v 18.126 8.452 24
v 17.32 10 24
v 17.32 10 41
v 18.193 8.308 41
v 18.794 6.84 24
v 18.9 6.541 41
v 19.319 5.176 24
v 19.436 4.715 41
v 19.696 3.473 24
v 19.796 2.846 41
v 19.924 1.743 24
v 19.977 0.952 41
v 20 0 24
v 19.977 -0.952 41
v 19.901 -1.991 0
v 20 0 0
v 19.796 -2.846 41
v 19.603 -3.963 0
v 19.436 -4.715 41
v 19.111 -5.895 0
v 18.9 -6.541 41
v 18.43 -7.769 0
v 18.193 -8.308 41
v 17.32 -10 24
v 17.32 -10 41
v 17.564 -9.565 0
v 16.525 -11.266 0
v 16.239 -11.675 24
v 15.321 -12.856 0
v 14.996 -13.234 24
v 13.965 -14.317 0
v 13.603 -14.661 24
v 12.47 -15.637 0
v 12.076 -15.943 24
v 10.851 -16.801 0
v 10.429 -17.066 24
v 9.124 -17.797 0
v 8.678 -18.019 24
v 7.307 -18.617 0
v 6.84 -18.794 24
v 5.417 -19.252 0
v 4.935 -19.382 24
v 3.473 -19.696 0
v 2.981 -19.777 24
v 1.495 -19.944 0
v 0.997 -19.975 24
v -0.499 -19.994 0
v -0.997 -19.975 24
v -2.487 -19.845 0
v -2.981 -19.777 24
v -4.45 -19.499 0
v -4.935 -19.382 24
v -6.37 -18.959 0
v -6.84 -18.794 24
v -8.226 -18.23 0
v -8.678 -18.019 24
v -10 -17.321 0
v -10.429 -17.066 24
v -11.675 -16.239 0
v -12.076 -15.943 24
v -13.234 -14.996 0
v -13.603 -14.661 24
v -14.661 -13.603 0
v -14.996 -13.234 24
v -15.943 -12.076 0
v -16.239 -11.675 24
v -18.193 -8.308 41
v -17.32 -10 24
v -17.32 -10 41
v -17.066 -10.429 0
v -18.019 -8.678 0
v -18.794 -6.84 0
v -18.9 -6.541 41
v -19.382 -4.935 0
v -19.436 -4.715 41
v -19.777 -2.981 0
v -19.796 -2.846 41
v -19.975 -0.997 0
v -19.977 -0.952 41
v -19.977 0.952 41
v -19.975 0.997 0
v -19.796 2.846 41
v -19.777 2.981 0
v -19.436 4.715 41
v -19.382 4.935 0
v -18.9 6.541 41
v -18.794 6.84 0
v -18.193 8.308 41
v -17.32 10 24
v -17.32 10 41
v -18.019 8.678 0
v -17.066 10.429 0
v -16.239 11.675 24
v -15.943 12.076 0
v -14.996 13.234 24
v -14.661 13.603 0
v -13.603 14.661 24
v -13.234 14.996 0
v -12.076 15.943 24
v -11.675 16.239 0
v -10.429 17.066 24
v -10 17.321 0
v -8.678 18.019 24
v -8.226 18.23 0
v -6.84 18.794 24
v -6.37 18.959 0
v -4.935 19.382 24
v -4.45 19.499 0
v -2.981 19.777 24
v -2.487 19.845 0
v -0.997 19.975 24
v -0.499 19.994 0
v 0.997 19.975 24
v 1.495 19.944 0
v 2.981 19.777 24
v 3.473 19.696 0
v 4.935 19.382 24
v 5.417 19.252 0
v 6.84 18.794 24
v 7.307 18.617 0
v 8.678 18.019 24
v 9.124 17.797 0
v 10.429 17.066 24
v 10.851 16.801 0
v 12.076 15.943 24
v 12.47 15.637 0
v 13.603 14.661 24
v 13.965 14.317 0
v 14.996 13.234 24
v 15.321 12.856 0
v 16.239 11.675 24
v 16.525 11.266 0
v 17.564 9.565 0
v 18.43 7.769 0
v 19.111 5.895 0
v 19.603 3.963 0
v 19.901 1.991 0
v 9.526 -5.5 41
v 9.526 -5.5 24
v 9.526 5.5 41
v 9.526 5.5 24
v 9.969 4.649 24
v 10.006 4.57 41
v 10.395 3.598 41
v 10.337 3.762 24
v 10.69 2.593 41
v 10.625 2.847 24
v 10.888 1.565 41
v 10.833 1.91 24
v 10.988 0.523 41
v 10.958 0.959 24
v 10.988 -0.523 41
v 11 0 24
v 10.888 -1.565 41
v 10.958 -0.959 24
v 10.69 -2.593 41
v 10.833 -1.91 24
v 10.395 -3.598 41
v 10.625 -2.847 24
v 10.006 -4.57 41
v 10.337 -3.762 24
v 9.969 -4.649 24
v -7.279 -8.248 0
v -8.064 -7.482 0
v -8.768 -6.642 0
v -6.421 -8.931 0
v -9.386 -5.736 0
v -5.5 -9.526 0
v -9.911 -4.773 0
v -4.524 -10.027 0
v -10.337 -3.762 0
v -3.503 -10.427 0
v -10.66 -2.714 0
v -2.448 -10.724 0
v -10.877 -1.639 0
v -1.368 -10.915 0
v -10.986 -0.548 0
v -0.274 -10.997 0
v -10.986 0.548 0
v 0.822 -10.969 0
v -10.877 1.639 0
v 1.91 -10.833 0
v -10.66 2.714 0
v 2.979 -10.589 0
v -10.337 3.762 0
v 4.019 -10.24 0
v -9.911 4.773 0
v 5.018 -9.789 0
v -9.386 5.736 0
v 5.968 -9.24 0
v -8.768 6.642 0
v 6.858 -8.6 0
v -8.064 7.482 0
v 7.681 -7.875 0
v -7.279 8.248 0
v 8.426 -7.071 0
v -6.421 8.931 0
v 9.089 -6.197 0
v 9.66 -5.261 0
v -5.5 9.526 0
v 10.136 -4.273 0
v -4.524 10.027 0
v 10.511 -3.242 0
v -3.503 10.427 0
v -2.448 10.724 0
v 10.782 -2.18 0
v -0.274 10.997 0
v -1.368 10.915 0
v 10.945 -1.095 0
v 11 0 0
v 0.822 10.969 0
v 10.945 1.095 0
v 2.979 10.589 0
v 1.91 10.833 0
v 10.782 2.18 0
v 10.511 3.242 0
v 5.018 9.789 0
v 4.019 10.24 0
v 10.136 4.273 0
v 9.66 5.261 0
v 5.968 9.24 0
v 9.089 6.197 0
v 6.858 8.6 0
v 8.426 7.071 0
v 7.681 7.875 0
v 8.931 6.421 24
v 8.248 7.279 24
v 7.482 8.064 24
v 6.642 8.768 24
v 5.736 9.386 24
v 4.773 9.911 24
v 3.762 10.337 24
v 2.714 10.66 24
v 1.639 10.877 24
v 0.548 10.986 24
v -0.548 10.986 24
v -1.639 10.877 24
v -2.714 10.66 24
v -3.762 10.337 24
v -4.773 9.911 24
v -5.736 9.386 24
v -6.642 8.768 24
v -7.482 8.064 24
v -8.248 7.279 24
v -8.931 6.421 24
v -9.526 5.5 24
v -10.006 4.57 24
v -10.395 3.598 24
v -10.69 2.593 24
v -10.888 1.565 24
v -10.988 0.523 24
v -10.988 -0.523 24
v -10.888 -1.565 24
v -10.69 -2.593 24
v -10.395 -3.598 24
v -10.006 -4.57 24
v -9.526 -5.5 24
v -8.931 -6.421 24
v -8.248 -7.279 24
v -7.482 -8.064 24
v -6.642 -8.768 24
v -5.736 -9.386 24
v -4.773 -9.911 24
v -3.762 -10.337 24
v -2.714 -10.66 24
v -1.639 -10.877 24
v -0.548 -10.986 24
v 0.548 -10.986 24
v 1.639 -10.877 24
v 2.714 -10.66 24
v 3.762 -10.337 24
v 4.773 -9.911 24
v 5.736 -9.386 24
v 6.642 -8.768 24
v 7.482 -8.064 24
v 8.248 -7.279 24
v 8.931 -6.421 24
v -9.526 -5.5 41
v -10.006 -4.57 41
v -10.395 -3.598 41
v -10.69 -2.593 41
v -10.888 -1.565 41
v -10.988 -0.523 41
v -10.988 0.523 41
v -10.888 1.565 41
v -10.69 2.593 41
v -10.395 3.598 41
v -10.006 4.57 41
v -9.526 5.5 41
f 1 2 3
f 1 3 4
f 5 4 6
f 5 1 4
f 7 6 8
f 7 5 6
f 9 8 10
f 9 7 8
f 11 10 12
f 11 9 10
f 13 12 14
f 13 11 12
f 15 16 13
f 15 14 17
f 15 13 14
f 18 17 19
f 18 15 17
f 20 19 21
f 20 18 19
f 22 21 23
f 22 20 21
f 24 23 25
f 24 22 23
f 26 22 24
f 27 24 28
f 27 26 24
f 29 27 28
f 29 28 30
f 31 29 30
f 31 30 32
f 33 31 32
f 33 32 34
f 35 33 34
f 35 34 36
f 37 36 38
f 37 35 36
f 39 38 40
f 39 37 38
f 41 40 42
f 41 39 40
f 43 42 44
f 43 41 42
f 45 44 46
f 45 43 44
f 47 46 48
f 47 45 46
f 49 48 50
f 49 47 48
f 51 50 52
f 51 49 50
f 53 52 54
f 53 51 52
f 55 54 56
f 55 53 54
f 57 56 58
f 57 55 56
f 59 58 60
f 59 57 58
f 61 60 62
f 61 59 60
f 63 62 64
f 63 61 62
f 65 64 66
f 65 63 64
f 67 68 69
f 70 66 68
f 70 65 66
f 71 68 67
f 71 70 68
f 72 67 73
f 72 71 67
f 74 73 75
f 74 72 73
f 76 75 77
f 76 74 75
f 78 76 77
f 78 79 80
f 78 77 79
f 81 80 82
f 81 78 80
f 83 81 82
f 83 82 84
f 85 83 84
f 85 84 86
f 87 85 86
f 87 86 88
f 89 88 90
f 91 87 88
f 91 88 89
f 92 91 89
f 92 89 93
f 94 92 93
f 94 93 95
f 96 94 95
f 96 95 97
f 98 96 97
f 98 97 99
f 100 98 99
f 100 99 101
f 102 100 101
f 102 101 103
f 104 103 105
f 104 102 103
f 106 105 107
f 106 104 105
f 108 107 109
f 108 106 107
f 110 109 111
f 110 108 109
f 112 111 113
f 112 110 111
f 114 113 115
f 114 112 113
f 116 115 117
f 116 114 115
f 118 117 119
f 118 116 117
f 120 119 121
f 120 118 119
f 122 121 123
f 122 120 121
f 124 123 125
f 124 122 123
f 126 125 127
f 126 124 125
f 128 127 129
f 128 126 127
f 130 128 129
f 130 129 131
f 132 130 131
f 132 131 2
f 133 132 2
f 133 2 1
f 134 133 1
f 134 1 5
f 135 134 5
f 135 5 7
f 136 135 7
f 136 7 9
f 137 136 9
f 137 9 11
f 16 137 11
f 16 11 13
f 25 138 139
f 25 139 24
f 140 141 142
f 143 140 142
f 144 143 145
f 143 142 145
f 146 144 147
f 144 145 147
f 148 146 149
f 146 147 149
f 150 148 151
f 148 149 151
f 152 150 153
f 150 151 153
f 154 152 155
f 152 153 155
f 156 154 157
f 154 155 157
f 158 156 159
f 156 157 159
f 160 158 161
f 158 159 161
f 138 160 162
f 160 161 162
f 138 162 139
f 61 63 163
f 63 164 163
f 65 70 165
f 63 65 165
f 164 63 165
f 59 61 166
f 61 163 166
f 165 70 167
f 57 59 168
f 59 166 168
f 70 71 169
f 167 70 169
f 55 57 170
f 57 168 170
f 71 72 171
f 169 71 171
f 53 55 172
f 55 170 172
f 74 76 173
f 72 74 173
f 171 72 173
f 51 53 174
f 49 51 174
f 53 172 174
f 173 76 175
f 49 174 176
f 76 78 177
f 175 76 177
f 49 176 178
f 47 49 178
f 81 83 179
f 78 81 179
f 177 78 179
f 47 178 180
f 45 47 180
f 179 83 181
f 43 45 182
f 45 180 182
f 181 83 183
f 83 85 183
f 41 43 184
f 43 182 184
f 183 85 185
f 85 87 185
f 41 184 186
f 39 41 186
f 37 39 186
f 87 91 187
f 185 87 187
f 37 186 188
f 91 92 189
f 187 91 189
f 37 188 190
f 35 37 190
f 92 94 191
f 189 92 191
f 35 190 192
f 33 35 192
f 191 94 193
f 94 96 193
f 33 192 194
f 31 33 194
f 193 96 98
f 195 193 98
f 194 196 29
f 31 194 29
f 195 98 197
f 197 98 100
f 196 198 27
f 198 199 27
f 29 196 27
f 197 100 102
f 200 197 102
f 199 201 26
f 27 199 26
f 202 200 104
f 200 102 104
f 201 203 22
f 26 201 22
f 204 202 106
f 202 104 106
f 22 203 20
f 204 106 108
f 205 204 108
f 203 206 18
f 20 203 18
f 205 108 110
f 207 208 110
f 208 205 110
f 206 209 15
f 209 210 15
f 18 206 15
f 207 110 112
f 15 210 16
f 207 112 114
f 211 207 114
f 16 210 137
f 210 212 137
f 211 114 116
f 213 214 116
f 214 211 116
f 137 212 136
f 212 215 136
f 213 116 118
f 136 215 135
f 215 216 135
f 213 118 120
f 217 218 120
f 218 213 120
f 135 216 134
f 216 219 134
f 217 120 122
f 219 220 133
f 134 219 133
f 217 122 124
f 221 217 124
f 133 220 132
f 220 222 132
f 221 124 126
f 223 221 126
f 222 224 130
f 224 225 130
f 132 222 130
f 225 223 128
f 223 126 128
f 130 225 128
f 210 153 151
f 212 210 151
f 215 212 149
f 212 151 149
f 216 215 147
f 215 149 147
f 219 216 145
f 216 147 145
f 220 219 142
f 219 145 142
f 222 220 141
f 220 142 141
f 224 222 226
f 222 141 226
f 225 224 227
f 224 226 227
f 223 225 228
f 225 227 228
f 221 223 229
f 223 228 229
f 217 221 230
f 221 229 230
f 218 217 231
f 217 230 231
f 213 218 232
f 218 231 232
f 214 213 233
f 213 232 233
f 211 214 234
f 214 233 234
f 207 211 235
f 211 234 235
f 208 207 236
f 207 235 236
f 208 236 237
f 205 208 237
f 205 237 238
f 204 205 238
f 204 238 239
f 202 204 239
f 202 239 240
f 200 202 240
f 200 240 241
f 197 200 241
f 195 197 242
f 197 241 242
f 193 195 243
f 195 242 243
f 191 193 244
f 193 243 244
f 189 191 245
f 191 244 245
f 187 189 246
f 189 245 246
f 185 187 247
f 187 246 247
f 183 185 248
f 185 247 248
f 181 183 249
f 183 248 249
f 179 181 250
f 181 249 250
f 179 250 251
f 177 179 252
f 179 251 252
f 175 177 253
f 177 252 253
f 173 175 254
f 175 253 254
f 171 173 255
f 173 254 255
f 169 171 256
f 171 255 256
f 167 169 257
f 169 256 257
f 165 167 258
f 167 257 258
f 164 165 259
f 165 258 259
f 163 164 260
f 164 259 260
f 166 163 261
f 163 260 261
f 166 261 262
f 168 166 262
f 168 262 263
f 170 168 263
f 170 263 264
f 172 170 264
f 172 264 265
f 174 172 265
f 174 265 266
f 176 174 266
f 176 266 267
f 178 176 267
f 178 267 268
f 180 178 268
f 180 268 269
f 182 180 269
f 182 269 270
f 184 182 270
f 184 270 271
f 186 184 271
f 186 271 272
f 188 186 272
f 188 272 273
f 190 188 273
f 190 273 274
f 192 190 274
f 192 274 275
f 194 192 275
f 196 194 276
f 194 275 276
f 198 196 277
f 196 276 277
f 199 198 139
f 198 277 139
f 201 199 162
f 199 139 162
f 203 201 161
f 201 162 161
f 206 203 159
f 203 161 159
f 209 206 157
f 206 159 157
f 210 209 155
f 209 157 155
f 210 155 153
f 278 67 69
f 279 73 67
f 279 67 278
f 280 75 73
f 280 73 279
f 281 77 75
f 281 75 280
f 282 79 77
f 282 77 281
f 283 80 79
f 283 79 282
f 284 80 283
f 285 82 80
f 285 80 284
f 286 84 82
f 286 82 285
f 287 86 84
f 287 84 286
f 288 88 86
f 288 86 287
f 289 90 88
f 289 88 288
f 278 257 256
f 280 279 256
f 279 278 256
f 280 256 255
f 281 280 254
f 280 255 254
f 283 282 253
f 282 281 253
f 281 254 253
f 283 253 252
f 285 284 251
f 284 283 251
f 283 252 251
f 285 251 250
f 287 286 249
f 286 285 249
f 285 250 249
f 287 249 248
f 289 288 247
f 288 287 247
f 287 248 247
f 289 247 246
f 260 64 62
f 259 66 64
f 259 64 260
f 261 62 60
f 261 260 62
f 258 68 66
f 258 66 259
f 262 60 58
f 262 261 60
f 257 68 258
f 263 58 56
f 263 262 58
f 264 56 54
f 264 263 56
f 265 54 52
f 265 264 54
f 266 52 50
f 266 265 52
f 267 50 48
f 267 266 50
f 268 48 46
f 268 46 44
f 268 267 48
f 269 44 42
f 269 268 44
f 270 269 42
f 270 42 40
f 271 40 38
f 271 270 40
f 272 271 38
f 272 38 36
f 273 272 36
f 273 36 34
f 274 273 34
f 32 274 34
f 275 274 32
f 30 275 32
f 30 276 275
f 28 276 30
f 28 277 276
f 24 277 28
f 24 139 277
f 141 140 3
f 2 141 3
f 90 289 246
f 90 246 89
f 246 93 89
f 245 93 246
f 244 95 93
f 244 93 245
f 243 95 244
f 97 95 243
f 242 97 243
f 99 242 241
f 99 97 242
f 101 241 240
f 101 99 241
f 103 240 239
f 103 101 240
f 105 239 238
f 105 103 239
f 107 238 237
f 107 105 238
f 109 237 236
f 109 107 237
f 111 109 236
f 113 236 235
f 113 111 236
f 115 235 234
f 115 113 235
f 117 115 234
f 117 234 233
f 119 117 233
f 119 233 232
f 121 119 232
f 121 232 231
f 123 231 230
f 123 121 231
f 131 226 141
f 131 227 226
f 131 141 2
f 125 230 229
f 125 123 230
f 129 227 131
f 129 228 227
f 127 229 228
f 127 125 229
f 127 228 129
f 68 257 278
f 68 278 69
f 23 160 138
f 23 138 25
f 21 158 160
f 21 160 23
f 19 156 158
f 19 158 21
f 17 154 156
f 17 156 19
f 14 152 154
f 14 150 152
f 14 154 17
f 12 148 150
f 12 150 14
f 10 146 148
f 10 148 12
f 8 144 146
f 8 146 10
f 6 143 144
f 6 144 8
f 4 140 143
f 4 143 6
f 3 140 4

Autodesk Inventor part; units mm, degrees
ref_plane "YZ Plane" through (0, 0, 0) normal (1, 0, 0) x (0, 1, 0)
ref_plane "XZ Plane" through (0, 0, 0) normal (0, 1, 0) x (-1, 0, 0)
ref_plane "XY Plane" through (0, 0, 0) normal (0, 0, 1) x (1, 0, 0)
sketch "Sketch1" plane through (0, 0, 0) normal (0, 0, 1) x (1, 0, 0)
  circle A0 centre (0, 0) radius 20
  dimension "d0" = 40
extrude "Extrusion1" add sketch "Sketch1" along normal blind 24
sketch "Sketch2" plane through (0, 0, 24) normal (0, 0, 1) x (1, 0, 0)
  arc A0 (-9.5263, 5.5) -> (-9.5263, -5.5) centre (0, 0) ccw
  line L0 (-9.5263, 5.5) -> (-17.3205, 10)
  circle A1 centre (0, 0) radius 20 projected
  line L1 (0, 0) -> (20, 0) construction
  line L2 (-9.5263, -5.5) -> (-17.3205, -10)
  line L3 (0, 0) -> (20, 0) construction
  line L4 (0, 0) -> (0, 20) construction
  arc A2 (9.5263, -5.5) -> (9.5263, 5.5) centre (0, 0) ccw
  line L5 (9.5263, 5.5) -> (17.3205, 10)
  line L6 (9.5263, -5.5) -> (17.3205, -10)
  dimension "d3" = 22
  dimension "d4" = 150
  dimension "d5" = 150
extrude "Extrusion2" add sketch "Sketch2" along normal blind 17 contours A0 L2 A1 L0 | A1 L6 A2 L5
sketch "Sketch3" plane through (0, 0, 24) normal (0, 0, 1) x (1, 0, 0)
  circle A0 centre (0, 0) radius 11
  dimension "d8" = 22
extrude "Extrusion3" cut sketch "Sketch3" against normal through all
properties part number "22MM JAW"
